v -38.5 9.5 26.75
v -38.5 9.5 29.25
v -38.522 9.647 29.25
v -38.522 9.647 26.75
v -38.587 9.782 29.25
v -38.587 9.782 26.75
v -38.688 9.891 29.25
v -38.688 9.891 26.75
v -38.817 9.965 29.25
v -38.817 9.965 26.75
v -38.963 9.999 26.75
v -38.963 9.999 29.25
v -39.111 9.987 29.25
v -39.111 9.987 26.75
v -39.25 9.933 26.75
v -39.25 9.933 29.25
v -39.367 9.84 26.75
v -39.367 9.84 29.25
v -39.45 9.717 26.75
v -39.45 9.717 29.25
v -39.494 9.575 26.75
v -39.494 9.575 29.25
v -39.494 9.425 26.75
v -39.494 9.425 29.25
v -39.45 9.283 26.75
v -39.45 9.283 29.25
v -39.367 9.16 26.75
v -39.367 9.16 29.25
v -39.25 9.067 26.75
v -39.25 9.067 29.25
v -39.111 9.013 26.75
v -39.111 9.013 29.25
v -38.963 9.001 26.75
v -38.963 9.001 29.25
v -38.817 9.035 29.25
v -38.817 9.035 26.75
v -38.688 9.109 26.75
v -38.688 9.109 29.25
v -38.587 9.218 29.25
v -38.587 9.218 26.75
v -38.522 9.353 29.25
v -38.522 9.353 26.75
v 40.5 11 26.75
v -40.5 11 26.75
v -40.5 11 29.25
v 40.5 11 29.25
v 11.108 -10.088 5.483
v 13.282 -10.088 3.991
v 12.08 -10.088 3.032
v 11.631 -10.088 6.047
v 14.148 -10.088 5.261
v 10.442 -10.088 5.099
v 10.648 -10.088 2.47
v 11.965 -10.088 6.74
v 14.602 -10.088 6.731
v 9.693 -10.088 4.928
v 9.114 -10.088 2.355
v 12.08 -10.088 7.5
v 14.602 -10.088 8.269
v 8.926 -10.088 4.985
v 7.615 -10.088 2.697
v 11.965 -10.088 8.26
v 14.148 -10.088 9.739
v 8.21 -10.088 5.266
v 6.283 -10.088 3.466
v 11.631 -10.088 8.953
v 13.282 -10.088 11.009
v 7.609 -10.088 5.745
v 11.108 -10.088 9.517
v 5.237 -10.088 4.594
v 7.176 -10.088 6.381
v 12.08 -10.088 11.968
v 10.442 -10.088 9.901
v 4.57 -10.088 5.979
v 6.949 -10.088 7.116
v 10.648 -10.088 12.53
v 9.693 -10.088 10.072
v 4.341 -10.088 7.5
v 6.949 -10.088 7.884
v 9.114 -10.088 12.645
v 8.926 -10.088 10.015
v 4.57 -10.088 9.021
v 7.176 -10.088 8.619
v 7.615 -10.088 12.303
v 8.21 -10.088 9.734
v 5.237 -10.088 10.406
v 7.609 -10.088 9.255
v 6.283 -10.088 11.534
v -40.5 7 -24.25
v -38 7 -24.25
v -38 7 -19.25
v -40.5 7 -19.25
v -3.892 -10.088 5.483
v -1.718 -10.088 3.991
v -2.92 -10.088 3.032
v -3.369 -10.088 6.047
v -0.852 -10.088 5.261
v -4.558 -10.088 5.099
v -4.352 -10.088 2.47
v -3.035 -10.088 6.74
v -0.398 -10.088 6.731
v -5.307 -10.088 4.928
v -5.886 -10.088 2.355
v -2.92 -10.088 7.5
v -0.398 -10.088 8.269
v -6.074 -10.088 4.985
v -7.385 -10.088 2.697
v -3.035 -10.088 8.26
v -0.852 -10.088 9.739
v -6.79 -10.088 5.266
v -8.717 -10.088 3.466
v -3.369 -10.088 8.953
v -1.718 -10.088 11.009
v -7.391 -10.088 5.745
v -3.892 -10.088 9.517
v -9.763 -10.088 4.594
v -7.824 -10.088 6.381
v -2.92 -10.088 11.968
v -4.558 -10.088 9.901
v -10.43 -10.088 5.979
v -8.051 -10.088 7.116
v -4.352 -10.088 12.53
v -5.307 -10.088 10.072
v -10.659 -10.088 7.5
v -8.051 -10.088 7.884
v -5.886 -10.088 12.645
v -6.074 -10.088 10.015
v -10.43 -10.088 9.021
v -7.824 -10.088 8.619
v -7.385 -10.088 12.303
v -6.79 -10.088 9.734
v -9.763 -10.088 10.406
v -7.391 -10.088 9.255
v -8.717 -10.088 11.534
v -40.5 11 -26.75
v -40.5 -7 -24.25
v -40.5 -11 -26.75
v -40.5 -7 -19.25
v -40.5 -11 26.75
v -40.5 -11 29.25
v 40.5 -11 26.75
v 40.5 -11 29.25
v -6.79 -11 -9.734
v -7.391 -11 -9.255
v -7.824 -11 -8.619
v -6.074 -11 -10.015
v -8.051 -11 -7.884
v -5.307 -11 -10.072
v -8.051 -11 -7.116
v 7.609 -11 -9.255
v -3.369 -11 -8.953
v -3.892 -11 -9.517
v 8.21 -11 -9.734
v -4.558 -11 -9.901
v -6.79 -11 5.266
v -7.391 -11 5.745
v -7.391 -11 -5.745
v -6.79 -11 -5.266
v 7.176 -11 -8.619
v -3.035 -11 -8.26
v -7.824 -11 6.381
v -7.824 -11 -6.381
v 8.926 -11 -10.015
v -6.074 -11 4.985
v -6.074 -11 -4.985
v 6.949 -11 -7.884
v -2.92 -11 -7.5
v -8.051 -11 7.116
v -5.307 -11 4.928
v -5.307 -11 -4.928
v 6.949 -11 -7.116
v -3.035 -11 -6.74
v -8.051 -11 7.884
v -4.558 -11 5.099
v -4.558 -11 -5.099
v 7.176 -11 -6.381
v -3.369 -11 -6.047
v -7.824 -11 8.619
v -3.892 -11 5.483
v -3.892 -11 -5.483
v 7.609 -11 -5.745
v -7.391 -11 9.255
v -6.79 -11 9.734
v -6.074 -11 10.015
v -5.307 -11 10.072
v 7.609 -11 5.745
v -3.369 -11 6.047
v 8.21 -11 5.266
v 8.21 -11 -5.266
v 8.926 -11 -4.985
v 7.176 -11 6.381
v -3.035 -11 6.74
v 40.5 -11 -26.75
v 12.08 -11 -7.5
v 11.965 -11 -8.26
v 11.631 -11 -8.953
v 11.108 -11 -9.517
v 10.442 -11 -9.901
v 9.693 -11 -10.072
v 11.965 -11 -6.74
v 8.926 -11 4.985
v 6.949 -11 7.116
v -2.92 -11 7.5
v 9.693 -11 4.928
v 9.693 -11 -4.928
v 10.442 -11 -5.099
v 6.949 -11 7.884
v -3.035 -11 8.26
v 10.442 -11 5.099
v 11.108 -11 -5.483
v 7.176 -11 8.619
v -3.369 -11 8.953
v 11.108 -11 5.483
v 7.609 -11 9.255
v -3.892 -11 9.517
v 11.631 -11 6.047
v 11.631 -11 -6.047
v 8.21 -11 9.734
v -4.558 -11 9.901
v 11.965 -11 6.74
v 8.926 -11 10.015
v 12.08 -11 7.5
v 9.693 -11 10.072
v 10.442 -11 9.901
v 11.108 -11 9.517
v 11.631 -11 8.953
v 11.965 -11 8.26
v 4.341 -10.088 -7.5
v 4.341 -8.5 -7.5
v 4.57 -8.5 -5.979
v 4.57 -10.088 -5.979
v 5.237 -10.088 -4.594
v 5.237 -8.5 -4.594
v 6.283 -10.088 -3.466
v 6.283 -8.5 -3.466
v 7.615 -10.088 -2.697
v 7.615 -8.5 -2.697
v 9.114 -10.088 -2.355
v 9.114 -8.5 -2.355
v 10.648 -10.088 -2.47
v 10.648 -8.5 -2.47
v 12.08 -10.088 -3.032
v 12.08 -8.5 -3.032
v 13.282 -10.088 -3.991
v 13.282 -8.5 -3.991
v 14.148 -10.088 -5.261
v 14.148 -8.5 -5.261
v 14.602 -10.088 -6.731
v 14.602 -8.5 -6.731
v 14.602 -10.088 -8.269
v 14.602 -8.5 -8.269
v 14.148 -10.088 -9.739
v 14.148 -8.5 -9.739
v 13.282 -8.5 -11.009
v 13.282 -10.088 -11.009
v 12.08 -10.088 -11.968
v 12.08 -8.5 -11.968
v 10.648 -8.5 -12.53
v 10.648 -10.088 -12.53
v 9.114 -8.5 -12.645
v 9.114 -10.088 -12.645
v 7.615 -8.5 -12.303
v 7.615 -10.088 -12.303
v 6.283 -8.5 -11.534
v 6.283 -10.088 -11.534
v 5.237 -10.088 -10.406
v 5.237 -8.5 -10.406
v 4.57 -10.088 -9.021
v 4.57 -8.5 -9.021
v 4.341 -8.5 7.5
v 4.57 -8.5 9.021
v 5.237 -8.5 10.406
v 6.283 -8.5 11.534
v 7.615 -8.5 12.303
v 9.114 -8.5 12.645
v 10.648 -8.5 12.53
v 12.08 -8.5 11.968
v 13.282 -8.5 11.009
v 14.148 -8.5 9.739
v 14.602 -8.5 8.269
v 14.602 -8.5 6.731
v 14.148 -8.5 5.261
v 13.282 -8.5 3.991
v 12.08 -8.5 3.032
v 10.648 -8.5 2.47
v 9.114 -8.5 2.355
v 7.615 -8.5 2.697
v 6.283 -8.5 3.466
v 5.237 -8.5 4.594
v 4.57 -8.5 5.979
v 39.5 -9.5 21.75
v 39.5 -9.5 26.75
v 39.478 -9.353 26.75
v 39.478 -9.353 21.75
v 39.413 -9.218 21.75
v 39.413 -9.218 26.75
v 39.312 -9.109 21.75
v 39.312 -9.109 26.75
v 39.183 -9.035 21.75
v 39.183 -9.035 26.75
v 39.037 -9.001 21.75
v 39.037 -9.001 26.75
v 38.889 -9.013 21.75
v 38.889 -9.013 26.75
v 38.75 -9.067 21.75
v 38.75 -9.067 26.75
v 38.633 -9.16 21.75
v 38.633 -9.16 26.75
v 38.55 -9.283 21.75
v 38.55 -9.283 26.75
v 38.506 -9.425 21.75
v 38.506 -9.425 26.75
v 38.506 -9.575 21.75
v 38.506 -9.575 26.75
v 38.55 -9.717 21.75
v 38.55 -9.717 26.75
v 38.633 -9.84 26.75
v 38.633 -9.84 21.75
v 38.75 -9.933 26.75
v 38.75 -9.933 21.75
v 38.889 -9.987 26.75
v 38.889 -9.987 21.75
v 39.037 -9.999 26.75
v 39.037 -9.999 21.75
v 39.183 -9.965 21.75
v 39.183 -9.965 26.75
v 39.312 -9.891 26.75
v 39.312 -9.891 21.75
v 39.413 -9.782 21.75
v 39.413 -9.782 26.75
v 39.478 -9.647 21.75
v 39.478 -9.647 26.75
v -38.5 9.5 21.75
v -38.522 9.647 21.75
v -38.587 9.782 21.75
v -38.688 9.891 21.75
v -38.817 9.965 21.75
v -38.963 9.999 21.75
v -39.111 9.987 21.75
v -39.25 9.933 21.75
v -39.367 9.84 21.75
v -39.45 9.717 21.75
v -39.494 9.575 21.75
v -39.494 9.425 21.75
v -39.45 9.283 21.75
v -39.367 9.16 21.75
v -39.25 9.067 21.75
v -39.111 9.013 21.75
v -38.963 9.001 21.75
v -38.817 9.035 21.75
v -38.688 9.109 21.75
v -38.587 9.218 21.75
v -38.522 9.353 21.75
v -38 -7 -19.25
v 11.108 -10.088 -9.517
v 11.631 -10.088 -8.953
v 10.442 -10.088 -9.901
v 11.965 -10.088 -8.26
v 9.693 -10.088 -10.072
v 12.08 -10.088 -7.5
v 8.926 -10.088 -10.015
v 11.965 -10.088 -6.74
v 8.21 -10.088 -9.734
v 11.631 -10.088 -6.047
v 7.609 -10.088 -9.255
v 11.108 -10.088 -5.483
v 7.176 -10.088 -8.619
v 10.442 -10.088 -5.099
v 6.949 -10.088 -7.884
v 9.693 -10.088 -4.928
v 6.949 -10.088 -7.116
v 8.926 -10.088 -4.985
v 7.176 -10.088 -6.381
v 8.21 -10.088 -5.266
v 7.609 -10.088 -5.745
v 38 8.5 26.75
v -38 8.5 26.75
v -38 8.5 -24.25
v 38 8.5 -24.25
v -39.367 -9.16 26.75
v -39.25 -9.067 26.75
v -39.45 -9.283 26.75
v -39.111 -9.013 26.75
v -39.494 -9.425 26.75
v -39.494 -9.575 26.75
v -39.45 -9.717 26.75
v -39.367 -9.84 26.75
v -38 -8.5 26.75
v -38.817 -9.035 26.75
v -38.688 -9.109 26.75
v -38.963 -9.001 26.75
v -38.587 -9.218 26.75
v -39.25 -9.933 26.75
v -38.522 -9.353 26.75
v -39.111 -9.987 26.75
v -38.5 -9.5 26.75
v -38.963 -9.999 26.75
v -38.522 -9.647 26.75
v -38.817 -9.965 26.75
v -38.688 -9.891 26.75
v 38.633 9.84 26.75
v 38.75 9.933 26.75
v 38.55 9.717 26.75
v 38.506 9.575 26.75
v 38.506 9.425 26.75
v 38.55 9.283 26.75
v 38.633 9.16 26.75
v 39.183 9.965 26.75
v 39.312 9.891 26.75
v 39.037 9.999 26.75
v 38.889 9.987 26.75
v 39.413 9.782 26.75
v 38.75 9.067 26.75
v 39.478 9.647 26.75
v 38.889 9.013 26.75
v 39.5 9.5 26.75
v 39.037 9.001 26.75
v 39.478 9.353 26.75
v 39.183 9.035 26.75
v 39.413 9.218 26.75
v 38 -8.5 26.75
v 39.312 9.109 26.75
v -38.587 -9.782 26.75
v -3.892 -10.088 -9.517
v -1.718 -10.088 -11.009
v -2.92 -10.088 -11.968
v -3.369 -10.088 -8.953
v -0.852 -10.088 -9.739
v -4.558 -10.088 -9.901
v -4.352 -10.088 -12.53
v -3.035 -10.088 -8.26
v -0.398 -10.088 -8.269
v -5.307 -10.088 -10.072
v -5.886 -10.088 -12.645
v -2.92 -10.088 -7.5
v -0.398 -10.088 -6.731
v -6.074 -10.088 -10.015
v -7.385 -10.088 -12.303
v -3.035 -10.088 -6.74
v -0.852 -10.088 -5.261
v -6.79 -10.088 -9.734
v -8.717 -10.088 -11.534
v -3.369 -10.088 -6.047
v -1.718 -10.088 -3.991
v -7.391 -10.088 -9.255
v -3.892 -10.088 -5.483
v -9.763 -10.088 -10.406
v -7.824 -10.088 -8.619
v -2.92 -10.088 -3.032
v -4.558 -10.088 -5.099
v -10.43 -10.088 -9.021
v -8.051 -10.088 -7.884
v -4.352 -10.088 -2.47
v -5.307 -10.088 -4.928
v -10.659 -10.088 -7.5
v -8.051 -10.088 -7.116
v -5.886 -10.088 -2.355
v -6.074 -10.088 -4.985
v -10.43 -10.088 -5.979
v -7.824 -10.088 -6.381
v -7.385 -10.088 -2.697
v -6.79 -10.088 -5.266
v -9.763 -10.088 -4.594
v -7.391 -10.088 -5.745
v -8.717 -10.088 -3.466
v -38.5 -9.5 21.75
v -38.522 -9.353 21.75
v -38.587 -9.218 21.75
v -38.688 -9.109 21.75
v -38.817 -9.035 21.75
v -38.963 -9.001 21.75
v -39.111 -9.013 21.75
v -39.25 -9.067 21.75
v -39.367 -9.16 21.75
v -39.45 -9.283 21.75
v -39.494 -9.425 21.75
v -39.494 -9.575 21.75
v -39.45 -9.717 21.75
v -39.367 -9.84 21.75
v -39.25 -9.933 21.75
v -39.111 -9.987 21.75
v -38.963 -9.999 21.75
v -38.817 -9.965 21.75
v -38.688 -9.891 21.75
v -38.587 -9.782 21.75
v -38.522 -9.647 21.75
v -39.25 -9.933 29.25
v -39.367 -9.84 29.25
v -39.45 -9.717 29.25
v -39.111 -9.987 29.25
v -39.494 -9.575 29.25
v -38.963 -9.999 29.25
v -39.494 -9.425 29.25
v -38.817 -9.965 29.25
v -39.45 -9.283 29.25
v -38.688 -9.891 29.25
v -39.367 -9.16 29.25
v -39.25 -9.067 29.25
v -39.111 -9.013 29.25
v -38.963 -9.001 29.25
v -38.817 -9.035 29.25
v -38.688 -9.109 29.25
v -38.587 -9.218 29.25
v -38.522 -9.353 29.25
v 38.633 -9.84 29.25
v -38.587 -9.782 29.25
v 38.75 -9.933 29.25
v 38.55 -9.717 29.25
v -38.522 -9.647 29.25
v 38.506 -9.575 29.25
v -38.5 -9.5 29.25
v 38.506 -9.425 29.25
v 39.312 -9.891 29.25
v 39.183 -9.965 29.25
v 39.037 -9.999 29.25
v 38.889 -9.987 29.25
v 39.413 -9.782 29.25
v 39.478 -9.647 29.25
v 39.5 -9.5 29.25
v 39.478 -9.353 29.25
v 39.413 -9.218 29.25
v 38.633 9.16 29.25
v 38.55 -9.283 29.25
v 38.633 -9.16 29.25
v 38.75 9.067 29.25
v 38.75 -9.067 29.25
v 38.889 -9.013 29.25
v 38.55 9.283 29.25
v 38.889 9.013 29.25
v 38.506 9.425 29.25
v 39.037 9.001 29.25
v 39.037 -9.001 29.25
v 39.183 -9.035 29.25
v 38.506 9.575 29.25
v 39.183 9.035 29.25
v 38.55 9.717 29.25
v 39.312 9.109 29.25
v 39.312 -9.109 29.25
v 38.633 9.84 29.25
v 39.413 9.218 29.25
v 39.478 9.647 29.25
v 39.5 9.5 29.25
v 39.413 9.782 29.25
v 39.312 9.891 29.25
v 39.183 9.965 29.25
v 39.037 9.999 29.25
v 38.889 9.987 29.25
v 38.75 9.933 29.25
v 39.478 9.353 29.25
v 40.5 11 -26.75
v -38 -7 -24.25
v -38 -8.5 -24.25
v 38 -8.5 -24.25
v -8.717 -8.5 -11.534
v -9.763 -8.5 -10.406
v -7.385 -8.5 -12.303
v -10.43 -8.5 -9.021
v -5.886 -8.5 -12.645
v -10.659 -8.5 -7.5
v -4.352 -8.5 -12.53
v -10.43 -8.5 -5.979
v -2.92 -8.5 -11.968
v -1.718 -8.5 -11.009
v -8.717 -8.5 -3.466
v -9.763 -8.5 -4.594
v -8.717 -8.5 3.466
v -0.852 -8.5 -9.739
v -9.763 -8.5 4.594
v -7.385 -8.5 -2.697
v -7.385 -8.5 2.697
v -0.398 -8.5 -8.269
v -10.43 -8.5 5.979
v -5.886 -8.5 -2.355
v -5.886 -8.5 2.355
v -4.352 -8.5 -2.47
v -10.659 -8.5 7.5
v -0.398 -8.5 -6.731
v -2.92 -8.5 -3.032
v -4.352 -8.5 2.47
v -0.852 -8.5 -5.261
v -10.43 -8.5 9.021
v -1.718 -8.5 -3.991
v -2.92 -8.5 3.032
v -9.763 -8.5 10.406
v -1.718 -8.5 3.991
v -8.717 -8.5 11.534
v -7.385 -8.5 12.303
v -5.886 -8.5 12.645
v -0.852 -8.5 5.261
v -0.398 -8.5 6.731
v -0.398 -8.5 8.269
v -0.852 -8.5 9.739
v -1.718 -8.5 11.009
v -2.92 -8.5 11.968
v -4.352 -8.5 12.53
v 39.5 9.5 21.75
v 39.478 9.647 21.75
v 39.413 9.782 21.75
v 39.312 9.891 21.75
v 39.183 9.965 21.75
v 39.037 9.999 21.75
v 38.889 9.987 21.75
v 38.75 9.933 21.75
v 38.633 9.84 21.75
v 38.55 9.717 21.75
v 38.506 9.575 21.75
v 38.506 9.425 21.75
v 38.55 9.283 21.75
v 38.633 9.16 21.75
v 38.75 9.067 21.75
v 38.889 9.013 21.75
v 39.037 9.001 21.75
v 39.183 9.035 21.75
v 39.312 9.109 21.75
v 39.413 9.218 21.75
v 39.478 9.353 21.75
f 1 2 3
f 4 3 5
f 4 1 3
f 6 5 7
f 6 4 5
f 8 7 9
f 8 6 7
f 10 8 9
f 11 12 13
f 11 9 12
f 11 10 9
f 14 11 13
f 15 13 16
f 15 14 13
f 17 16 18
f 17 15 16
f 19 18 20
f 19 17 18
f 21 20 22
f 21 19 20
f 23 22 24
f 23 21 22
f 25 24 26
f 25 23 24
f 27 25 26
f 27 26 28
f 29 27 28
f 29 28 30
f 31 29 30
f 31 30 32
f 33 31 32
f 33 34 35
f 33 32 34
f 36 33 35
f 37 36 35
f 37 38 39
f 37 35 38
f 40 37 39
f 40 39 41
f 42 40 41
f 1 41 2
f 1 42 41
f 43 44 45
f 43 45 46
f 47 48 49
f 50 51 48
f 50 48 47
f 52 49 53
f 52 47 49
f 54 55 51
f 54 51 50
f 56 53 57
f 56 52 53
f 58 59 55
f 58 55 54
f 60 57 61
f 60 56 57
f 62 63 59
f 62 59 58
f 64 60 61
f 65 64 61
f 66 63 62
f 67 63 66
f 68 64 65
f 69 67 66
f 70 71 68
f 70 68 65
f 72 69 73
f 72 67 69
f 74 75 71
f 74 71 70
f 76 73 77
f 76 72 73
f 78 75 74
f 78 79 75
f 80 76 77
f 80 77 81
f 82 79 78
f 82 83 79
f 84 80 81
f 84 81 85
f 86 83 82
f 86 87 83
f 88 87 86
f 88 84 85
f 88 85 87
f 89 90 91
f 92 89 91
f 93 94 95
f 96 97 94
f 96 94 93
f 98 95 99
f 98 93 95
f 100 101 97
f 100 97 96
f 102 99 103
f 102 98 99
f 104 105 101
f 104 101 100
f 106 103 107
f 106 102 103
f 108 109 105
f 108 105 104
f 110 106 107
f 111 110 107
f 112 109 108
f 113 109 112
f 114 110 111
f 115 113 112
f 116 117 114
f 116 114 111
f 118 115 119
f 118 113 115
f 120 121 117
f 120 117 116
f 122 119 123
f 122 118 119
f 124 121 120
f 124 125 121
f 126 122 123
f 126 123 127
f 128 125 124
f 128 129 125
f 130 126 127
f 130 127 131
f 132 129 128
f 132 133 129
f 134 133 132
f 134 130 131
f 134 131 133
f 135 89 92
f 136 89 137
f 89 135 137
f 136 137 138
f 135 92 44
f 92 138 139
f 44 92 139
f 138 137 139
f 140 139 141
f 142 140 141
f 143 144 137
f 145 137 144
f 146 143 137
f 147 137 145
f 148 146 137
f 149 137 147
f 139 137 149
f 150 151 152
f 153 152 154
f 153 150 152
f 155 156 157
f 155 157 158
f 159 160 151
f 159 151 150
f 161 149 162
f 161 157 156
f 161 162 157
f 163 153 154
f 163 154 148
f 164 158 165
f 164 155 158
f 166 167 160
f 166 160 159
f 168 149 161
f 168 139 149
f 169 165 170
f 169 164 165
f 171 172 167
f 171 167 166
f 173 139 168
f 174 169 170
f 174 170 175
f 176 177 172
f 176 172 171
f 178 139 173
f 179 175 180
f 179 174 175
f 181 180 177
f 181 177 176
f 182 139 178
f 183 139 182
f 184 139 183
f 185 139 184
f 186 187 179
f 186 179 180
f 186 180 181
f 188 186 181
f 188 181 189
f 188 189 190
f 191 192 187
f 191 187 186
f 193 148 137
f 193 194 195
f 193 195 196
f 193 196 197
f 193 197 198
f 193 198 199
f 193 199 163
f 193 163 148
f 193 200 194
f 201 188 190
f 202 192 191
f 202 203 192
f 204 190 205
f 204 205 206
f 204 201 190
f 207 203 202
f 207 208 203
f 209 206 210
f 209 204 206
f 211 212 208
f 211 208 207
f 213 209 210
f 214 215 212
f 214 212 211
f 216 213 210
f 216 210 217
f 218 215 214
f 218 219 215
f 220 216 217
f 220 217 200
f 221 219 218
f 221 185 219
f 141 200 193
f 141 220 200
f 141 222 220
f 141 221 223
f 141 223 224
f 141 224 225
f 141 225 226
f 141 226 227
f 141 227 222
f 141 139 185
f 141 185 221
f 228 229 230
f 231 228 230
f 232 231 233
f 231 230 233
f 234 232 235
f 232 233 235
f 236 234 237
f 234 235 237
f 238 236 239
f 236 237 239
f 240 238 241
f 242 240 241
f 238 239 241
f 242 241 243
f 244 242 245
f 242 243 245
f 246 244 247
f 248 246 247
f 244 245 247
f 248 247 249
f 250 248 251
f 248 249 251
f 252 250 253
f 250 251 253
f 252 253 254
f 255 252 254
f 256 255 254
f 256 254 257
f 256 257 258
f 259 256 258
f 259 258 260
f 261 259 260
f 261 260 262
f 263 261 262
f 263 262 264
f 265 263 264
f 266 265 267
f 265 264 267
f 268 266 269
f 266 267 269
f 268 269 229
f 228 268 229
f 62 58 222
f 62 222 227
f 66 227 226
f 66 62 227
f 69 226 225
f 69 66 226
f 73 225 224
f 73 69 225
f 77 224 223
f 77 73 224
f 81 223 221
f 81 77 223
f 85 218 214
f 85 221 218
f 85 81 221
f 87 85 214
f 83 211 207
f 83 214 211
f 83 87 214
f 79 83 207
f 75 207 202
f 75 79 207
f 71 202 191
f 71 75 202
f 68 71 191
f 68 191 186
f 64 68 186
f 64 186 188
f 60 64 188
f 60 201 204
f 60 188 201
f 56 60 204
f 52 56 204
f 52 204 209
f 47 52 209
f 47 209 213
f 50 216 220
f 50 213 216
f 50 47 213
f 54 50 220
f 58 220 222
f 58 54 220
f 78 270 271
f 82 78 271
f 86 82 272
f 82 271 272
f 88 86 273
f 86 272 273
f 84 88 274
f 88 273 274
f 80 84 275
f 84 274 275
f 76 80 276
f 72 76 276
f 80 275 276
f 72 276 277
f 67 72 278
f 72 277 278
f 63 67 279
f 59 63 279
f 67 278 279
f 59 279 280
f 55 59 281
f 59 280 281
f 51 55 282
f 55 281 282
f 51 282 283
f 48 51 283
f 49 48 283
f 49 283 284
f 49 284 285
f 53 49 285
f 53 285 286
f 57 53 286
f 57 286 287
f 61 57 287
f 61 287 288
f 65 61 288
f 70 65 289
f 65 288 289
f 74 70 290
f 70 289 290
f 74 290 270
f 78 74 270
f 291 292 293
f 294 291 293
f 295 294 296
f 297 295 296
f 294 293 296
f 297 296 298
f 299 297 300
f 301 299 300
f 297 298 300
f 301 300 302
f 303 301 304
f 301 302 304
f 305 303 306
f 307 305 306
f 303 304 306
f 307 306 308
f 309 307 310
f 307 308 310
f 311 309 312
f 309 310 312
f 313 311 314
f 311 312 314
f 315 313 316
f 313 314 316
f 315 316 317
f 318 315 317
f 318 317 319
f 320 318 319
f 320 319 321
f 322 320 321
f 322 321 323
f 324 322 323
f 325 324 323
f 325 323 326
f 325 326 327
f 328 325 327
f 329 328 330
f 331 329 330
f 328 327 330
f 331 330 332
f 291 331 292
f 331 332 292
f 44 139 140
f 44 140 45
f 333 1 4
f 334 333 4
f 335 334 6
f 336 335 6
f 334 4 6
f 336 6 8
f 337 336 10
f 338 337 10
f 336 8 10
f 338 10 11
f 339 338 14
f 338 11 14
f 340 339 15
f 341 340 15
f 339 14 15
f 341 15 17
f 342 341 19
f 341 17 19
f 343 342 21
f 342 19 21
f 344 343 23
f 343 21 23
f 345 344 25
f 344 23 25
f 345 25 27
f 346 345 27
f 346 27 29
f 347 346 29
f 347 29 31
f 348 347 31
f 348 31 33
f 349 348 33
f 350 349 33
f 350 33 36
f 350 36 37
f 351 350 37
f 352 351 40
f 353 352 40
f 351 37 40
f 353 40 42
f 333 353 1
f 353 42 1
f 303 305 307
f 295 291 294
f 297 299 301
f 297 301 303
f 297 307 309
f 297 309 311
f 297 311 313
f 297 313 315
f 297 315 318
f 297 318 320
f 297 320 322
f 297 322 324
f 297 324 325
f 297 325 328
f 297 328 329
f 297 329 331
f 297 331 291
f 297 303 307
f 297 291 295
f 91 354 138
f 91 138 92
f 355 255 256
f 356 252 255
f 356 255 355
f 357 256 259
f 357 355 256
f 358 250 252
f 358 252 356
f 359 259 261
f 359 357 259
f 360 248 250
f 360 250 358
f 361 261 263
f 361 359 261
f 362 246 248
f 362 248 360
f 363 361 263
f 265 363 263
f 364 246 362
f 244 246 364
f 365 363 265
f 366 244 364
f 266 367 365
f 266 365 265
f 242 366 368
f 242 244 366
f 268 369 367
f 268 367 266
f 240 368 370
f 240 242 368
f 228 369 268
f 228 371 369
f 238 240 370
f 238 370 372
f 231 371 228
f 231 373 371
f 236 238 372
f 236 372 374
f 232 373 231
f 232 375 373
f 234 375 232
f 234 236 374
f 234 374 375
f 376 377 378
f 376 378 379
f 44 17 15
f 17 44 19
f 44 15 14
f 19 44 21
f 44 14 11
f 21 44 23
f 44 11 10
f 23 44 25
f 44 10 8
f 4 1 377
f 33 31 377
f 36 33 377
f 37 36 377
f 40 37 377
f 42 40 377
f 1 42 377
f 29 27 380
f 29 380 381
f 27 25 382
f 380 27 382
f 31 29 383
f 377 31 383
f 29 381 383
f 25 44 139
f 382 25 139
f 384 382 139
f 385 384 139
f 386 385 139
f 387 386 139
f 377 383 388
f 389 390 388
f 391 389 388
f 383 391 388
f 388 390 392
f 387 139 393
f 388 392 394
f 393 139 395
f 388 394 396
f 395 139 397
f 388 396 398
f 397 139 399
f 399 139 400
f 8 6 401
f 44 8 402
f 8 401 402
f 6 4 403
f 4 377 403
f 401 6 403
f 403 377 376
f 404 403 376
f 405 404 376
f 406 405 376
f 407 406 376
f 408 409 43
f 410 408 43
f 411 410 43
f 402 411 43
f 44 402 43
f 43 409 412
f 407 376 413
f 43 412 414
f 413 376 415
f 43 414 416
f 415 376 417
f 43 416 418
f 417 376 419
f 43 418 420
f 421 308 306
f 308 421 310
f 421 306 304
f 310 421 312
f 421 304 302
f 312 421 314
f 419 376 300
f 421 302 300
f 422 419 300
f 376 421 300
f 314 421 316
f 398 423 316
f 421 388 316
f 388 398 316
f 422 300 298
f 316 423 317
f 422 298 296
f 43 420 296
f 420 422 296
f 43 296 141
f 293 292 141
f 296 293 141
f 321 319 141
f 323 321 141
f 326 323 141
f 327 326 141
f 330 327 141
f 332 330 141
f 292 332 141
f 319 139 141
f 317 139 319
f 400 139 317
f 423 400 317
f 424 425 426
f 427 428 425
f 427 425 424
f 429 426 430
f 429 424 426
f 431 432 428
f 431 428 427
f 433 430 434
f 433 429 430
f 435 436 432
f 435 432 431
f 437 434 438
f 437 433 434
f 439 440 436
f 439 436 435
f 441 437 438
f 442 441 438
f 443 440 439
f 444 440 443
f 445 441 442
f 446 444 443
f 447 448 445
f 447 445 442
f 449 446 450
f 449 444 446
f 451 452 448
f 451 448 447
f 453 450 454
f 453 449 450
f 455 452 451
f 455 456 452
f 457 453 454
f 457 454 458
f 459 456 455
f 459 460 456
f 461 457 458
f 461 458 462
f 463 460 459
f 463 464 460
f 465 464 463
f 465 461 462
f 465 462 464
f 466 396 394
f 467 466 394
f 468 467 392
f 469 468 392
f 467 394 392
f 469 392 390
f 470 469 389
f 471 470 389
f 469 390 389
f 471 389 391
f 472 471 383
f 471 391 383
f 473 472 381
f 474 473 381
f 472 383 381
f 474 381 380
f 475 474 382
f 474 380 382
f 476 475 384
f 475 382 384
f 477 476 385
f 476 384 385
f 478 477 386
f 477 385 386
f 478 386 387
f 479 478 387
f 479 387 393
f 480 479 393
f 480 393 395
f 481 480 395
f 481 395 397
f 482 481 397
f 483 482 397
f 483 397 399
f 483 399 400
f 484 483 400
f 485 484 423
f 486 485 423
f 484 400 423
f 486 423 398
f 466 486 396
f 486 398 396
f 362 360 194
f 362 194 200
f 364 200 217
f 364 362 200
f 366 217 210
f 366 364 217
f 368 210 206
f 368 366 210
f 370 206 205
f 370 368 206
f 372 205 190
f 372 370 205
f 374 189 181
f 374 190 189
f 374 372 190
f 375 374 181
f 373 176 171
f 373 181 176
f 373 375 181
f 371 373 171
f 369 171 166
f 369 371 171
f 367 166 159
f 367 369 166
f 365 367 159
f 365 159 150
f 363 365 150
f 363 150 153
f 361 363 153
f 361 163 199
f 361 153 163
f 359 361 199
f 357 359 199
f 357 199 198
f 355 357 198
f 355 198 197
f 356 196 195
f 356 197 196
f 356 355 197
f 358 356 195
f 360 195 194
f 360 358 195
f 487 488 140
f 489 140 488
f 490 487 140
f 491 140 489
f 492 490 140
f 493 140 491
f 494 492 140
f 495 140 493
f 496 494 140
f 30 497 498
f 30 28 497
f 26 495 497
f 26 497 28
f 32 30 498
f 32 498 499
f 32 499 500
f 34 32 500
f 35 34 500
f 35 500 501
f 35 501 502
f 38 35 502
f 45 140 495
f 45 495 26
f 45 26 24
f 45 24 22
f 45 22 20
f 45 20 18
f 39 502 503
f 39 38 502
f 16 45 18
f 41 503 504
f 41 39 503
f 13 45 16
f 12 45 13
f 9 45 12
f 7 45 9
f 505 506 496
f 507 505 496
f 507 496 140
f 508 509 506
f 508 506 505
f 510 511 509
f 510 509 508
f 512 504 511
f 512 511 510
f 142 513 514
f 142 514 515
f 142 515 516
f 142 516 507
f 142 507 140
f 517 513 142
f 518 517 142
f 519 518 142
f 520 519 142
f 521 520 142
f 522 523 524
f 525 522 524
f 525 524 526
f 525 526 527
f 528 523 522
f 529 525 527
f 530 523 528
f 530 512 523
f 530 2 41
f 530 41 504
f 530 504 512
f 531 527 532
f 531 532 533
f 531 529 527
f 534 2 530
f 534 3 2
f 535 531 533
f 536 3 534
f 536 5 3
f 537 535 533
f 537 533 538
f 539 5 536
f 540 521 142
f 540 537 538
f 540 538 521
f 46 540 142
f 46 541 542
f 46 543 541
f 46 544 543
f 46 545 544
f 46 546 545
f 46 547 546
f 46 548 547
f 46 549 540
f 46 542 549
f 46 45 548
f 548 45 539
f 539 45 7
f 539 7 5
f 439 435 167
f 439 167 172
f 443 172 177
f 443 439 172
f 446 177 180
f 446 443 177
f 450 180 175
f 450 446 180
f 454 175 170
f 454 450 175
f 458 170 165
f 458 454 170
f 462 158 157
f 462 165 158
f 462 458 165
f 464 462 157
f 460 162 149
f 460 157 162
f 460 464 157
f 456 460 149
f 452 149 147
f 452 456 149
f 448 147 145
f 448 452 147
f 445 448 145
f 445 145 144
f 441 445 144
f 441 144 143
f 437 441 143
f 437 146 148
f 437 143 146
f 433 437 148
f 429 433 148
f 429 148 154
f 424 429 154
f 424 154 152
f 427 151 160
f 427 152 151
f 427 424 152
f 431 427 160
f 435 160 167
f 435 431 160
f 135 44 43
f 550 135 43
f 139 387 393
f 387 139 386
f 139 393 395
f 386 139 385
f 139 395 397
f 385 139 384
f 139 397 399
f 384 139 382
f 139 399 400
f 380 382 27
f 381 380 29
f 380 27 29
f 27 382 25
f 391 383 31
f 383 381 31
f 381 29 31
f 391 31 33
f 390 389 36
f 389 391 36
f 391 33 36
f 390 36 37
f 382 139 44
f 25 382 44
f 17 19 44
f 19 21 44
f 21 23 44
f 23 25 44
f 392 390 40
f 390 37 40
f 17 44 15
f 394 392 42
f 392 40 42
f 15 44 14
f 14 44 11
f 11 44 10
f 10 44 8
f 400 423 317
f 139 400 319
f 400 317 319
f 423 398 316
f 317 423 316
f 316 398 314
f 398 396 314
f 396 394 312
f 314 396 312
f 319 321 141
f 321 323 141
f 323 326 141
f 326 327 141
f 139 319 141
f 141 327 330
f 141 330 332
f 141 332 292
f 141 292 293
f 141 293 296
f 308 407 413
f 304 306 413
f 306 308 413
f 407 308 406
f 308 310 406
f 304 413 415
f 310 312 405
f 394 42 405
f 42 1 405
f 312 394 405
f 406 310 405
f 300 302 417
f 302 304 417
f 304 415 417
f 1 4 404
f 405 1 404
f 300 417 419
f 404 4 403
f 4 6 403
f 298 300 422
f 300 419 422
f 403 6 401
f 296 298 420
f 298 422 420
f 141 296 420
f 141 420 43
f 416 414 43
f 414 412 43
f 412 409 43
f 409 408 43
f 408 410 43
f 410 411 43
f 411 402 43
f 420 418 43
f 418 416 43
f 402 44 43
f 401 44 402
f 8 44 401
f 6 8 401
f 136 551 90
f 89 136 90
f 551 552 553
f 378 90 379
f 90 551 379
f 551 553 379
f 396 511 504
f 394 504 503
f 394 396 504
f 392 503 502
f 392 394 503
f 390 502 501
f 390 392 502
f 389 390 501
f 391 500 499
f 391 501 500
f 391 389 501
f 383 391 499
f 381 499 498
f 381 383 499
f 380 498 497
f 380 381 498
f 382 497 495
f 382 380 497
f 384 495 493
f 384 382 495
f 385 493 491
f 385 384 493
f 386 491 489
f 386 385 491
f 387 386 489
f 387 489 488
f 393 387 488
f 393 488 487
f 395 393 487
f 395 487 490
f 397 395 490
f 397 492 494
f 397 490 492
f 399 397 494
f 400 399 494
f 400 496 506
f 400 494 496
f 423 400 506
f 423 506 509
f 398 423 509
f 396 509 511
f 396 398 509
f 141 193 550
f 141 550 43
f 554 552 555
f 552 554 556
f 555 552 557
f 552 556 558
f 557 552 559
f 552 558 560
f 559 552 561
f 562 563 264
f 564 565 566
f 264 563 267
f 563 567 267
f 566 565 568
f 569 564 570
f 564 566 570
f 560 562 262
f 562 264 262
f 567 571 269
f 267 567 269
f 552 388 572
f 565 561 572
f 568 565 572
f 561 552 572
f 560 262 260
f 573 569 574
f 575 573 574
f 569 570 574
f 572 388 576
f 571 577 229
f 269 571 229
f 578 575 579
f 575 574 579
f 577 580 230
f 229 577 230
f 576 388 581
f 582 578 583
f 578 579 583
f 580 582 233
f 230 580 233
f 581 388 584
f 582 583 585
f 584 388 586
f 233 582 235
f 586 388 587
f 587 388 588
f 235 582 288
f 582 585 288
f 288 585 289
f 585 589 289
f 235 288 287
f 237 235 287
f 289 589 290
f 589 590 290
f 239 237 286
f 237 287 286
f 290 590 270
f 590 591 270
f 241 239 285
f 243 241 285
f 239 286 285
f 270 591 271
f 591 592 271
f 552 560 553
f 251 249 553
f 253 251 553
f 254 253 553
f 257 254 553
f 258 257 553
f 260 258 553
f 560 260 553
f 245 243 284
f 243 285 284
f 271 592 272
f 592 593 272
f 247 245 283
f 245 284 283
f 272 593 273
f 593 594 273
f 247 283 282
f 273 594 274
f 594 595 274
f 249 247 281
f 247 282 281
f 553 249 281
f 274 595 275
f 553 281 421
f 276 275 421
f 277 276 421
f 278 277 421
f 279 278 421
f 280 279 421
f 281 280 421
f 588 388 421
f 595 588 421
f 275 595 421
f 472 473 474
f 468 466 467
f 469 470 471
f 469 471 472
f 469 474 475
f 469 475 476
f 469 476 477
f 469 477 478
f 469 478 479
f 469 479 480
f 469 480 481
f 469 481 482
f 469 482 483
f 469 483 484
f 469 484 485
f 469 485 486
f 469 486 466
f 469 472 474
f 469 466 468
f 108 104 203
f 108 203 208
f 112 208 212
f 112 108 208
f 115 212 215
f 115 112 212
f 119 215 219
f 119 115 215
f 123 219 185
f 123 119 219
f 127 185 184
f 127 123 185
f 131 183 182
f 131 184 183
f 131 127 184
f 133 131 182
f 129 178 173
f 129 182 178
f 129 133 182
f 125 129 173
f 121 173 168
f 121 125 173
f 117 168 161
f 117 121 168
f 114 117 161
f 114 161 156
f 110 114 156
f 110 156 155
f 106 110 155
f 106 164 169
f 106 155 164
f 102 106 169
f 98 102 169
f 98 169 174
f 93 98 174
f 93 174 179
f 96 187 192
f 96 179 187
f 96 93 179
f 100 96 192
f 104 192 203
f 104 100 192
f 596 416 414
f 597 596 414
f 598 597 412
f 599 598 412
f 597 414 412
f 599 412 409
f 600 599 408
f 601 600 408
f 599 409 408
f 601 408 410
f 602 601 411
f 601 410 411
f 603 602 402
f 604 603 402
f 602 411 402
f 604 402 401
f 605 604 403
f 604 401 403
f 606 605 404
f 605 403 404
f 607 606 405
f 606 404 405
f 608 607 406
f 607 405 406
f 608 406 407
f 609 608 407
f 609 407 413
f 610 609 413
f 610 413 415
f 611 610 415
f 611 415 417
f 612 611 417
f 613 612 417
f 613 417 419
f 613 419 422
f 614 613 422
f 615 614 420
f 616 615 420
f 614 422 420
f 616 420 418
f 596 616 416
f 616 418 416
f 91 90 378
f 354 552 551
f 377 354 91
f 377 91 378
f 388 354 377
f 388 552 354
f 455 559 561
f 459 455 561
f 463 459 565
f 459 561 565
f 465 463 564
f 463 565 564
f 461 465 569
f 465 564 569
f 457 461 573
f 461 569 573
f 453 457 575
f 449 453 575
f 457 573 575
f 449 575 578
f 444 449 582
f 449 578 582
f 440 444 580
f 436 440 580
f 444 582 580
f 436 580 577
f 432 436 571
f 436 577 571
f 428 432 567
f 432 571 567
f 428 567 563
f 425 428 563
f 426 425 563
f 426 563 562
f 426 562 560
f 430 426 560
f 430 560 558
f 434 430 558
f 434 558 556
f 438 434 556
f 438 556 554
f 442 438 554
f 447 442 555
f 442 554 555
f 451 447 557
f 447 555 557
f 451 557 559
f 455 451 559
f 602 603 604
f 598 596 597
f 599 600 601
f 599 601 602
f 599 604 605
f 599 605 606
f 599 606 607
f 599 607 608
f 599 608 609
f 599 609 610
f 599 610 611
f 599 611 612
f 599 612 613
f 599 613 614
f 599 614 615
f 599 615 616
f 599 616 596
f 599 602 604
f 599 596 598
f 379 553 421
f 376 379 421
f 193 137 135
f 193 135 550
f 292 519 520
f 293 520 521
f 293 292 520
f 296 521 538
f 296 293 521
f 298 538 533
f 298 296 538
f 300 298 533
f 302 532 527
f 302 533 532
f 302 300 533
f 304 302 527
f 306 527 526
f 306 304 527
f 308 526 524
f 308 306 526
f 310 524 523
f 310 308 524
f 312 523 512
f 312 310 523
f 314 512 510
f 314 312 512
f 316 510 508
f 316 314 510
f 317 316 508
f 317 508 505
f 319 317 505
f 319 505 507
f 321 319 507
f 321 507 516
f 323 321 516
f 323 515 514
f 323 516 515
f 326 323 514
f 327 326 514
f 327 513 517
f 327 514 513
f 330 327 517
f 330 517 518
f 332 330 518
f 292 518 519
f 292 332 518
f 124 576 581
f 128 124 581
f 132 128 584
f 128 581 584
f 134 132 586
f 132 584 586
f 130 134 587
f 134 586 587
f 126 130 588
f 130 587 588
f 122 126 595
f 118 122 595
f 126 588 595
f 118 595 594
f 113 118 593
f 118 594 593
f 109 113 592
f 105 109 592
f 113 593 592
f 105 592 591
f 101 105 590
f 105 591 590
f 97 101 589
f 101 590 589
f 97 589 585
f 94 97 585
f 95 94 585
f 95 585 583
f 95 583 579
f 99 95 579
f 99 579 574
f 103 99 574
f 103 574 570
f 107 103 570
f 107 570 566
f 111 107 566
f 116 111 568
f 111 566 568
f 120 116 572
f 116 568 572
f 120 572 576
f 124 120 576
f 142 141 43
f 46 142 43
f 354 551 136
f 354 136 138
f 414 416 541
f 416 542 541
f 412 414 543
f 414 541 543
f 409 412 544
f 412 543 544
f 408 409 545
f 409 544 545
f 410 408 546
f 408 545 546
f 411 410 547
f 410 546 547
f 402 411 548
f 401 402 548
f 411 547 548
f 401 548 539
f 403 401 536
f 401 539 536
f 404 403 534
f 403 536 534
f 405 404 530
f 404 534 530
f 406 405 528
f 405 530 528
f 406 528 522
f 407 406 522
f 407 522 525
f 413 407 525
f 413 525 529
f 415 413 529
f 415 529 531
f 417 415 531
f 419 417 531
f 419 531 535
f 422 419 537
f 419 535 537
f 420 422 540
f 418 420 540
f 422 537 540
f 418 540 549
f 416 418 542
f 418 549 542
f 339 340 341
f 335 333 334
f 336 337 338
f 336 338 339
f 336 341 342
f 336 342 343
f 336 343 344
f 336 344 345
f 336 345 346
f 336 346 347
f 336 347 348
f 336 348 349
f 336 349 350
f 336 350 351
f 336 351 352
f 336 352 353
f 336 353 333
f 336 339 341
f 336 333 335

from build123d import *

# Parameters (mm, degrees)
F0_W      = 81
F0_H      = 53.5
F1_DEPTH  = 11
F2_T      = -2.5
F3_W      = 14
F3_H      = 5
F4_DEPTH  = 49.6
F5_R      = 2.5796875
F6_DEPTH  = 25
F8_W      = 81
F8_H      = 22
F9_DEPTH  = 2.5
F11_R     = 0.5
F12_DEPTH = 5
F10_R     = 0.5
F13_DEPTH = 5
F14_R     = 5.159375
F15_DEPTH = 1.5875


# Not quite as in the source:
# - a length typed as a fraction of an inch, garbled in the dataset ("3 / 203.2 mm" for 3/8 in), is restored


with BuildPart() as f1:
    # F0 (on Front) → F1 (new body, symmetric)
    with BuildSketch(Plane.XZ):
        Rectangle(F0_W, F0_H)
    extrude(amount=F1_DEPTH, both=True)

    # F2
    f2_openings = [f1.faces().sort_by_distance(p)[0] for p in [
        (0, 0, 26.75),
    ]]
    offset(amount=F2_T, openings=f2_openings)

    # F3 (on Right) → F4 (cut)
    with BuildSketch(Plane.YZ):
        with Locations((0, -21.75)):
            Rectangle(F3_W, F3_H)
    extrude(amount=-F4_DEPTH, mode=Mode.SUBTRACT)

    # F5 (on Front) → F6 (cut)
    with BuildSketch(Plane.XZ):
        with Locations((-5.5, -7.5)):
            Circle(F5_R)
        with Locations((9.5, -7.5)):
            Circle(F5_R)
        with Locations((9.5, 7.5)):
            Circle(F5_R)
        with Locations((-5.5, 7.5)):
            Circle(F5_R)
    extrude(amount=F6_DEPTH, mode=Mode.SUBTRACT)

    # F11 (on face) → F12 (cut)
    with BuildSketch(Plane.XY.offset(26.75)):
        with Locations((-39, 9.5)):
            Circle(F11_R)
        with Locations((-39, -9.5)):
            Circle(F11_R)
        with Locations((39, -9.5)):
            Circle(F11_R)
        with Locations((39, 9.5)):
            Circle(F11_R)
    extrude(amount=-F12_DEPTH, mode=Mode.SUBTRACT)

    # F14 (on face) → F15 (cut)
    with BuildSketch(Plane(origin=(0, -8.5, 0), x_dir=(-1, 0, 0), z_dir=(0, 1, 0))):
        with Locations((5.5, -7.5)):
            Circle(F14_R)
        with Locations((5.5, 7.5)):
            Circle(F14_R)
        with Locations((-9.5, -7.5)):
            Circle(F14_R)
        with Locations((-9.5, 7.5)):
            Circle(F14_R)
    extrude(amount=-F15_DEPTH, mode=Mode.SUBTRACT)


with BuildPart() as f9:
    # F8 (on offset) → F9 (new body)
    with BuildSketch(Plane.XY.offset(26.75)):
        Rectangle(F8_W, F8_H)
    extrude(amount=F9_DEPTH)

    # F10 (on offset) → F13 (cut, symmetric)
    with BuildSketch(Plane.XY.offset(26.75)):
        with Locations((-39, 9.5)):
            Circle(F10_R)
        with Locations((-39, -9.5)):
            Circle(F10_R)
        with Locations((39, -9.5)):
            Circle(F10_R)
        with Locations((39, 9.5)):
            Circle(F10_R)
    extrude(amount=F13_DEPTH, both=True, mode=Mode.SUBTRACT)


solid = Compound([f1.part, f9.part])
